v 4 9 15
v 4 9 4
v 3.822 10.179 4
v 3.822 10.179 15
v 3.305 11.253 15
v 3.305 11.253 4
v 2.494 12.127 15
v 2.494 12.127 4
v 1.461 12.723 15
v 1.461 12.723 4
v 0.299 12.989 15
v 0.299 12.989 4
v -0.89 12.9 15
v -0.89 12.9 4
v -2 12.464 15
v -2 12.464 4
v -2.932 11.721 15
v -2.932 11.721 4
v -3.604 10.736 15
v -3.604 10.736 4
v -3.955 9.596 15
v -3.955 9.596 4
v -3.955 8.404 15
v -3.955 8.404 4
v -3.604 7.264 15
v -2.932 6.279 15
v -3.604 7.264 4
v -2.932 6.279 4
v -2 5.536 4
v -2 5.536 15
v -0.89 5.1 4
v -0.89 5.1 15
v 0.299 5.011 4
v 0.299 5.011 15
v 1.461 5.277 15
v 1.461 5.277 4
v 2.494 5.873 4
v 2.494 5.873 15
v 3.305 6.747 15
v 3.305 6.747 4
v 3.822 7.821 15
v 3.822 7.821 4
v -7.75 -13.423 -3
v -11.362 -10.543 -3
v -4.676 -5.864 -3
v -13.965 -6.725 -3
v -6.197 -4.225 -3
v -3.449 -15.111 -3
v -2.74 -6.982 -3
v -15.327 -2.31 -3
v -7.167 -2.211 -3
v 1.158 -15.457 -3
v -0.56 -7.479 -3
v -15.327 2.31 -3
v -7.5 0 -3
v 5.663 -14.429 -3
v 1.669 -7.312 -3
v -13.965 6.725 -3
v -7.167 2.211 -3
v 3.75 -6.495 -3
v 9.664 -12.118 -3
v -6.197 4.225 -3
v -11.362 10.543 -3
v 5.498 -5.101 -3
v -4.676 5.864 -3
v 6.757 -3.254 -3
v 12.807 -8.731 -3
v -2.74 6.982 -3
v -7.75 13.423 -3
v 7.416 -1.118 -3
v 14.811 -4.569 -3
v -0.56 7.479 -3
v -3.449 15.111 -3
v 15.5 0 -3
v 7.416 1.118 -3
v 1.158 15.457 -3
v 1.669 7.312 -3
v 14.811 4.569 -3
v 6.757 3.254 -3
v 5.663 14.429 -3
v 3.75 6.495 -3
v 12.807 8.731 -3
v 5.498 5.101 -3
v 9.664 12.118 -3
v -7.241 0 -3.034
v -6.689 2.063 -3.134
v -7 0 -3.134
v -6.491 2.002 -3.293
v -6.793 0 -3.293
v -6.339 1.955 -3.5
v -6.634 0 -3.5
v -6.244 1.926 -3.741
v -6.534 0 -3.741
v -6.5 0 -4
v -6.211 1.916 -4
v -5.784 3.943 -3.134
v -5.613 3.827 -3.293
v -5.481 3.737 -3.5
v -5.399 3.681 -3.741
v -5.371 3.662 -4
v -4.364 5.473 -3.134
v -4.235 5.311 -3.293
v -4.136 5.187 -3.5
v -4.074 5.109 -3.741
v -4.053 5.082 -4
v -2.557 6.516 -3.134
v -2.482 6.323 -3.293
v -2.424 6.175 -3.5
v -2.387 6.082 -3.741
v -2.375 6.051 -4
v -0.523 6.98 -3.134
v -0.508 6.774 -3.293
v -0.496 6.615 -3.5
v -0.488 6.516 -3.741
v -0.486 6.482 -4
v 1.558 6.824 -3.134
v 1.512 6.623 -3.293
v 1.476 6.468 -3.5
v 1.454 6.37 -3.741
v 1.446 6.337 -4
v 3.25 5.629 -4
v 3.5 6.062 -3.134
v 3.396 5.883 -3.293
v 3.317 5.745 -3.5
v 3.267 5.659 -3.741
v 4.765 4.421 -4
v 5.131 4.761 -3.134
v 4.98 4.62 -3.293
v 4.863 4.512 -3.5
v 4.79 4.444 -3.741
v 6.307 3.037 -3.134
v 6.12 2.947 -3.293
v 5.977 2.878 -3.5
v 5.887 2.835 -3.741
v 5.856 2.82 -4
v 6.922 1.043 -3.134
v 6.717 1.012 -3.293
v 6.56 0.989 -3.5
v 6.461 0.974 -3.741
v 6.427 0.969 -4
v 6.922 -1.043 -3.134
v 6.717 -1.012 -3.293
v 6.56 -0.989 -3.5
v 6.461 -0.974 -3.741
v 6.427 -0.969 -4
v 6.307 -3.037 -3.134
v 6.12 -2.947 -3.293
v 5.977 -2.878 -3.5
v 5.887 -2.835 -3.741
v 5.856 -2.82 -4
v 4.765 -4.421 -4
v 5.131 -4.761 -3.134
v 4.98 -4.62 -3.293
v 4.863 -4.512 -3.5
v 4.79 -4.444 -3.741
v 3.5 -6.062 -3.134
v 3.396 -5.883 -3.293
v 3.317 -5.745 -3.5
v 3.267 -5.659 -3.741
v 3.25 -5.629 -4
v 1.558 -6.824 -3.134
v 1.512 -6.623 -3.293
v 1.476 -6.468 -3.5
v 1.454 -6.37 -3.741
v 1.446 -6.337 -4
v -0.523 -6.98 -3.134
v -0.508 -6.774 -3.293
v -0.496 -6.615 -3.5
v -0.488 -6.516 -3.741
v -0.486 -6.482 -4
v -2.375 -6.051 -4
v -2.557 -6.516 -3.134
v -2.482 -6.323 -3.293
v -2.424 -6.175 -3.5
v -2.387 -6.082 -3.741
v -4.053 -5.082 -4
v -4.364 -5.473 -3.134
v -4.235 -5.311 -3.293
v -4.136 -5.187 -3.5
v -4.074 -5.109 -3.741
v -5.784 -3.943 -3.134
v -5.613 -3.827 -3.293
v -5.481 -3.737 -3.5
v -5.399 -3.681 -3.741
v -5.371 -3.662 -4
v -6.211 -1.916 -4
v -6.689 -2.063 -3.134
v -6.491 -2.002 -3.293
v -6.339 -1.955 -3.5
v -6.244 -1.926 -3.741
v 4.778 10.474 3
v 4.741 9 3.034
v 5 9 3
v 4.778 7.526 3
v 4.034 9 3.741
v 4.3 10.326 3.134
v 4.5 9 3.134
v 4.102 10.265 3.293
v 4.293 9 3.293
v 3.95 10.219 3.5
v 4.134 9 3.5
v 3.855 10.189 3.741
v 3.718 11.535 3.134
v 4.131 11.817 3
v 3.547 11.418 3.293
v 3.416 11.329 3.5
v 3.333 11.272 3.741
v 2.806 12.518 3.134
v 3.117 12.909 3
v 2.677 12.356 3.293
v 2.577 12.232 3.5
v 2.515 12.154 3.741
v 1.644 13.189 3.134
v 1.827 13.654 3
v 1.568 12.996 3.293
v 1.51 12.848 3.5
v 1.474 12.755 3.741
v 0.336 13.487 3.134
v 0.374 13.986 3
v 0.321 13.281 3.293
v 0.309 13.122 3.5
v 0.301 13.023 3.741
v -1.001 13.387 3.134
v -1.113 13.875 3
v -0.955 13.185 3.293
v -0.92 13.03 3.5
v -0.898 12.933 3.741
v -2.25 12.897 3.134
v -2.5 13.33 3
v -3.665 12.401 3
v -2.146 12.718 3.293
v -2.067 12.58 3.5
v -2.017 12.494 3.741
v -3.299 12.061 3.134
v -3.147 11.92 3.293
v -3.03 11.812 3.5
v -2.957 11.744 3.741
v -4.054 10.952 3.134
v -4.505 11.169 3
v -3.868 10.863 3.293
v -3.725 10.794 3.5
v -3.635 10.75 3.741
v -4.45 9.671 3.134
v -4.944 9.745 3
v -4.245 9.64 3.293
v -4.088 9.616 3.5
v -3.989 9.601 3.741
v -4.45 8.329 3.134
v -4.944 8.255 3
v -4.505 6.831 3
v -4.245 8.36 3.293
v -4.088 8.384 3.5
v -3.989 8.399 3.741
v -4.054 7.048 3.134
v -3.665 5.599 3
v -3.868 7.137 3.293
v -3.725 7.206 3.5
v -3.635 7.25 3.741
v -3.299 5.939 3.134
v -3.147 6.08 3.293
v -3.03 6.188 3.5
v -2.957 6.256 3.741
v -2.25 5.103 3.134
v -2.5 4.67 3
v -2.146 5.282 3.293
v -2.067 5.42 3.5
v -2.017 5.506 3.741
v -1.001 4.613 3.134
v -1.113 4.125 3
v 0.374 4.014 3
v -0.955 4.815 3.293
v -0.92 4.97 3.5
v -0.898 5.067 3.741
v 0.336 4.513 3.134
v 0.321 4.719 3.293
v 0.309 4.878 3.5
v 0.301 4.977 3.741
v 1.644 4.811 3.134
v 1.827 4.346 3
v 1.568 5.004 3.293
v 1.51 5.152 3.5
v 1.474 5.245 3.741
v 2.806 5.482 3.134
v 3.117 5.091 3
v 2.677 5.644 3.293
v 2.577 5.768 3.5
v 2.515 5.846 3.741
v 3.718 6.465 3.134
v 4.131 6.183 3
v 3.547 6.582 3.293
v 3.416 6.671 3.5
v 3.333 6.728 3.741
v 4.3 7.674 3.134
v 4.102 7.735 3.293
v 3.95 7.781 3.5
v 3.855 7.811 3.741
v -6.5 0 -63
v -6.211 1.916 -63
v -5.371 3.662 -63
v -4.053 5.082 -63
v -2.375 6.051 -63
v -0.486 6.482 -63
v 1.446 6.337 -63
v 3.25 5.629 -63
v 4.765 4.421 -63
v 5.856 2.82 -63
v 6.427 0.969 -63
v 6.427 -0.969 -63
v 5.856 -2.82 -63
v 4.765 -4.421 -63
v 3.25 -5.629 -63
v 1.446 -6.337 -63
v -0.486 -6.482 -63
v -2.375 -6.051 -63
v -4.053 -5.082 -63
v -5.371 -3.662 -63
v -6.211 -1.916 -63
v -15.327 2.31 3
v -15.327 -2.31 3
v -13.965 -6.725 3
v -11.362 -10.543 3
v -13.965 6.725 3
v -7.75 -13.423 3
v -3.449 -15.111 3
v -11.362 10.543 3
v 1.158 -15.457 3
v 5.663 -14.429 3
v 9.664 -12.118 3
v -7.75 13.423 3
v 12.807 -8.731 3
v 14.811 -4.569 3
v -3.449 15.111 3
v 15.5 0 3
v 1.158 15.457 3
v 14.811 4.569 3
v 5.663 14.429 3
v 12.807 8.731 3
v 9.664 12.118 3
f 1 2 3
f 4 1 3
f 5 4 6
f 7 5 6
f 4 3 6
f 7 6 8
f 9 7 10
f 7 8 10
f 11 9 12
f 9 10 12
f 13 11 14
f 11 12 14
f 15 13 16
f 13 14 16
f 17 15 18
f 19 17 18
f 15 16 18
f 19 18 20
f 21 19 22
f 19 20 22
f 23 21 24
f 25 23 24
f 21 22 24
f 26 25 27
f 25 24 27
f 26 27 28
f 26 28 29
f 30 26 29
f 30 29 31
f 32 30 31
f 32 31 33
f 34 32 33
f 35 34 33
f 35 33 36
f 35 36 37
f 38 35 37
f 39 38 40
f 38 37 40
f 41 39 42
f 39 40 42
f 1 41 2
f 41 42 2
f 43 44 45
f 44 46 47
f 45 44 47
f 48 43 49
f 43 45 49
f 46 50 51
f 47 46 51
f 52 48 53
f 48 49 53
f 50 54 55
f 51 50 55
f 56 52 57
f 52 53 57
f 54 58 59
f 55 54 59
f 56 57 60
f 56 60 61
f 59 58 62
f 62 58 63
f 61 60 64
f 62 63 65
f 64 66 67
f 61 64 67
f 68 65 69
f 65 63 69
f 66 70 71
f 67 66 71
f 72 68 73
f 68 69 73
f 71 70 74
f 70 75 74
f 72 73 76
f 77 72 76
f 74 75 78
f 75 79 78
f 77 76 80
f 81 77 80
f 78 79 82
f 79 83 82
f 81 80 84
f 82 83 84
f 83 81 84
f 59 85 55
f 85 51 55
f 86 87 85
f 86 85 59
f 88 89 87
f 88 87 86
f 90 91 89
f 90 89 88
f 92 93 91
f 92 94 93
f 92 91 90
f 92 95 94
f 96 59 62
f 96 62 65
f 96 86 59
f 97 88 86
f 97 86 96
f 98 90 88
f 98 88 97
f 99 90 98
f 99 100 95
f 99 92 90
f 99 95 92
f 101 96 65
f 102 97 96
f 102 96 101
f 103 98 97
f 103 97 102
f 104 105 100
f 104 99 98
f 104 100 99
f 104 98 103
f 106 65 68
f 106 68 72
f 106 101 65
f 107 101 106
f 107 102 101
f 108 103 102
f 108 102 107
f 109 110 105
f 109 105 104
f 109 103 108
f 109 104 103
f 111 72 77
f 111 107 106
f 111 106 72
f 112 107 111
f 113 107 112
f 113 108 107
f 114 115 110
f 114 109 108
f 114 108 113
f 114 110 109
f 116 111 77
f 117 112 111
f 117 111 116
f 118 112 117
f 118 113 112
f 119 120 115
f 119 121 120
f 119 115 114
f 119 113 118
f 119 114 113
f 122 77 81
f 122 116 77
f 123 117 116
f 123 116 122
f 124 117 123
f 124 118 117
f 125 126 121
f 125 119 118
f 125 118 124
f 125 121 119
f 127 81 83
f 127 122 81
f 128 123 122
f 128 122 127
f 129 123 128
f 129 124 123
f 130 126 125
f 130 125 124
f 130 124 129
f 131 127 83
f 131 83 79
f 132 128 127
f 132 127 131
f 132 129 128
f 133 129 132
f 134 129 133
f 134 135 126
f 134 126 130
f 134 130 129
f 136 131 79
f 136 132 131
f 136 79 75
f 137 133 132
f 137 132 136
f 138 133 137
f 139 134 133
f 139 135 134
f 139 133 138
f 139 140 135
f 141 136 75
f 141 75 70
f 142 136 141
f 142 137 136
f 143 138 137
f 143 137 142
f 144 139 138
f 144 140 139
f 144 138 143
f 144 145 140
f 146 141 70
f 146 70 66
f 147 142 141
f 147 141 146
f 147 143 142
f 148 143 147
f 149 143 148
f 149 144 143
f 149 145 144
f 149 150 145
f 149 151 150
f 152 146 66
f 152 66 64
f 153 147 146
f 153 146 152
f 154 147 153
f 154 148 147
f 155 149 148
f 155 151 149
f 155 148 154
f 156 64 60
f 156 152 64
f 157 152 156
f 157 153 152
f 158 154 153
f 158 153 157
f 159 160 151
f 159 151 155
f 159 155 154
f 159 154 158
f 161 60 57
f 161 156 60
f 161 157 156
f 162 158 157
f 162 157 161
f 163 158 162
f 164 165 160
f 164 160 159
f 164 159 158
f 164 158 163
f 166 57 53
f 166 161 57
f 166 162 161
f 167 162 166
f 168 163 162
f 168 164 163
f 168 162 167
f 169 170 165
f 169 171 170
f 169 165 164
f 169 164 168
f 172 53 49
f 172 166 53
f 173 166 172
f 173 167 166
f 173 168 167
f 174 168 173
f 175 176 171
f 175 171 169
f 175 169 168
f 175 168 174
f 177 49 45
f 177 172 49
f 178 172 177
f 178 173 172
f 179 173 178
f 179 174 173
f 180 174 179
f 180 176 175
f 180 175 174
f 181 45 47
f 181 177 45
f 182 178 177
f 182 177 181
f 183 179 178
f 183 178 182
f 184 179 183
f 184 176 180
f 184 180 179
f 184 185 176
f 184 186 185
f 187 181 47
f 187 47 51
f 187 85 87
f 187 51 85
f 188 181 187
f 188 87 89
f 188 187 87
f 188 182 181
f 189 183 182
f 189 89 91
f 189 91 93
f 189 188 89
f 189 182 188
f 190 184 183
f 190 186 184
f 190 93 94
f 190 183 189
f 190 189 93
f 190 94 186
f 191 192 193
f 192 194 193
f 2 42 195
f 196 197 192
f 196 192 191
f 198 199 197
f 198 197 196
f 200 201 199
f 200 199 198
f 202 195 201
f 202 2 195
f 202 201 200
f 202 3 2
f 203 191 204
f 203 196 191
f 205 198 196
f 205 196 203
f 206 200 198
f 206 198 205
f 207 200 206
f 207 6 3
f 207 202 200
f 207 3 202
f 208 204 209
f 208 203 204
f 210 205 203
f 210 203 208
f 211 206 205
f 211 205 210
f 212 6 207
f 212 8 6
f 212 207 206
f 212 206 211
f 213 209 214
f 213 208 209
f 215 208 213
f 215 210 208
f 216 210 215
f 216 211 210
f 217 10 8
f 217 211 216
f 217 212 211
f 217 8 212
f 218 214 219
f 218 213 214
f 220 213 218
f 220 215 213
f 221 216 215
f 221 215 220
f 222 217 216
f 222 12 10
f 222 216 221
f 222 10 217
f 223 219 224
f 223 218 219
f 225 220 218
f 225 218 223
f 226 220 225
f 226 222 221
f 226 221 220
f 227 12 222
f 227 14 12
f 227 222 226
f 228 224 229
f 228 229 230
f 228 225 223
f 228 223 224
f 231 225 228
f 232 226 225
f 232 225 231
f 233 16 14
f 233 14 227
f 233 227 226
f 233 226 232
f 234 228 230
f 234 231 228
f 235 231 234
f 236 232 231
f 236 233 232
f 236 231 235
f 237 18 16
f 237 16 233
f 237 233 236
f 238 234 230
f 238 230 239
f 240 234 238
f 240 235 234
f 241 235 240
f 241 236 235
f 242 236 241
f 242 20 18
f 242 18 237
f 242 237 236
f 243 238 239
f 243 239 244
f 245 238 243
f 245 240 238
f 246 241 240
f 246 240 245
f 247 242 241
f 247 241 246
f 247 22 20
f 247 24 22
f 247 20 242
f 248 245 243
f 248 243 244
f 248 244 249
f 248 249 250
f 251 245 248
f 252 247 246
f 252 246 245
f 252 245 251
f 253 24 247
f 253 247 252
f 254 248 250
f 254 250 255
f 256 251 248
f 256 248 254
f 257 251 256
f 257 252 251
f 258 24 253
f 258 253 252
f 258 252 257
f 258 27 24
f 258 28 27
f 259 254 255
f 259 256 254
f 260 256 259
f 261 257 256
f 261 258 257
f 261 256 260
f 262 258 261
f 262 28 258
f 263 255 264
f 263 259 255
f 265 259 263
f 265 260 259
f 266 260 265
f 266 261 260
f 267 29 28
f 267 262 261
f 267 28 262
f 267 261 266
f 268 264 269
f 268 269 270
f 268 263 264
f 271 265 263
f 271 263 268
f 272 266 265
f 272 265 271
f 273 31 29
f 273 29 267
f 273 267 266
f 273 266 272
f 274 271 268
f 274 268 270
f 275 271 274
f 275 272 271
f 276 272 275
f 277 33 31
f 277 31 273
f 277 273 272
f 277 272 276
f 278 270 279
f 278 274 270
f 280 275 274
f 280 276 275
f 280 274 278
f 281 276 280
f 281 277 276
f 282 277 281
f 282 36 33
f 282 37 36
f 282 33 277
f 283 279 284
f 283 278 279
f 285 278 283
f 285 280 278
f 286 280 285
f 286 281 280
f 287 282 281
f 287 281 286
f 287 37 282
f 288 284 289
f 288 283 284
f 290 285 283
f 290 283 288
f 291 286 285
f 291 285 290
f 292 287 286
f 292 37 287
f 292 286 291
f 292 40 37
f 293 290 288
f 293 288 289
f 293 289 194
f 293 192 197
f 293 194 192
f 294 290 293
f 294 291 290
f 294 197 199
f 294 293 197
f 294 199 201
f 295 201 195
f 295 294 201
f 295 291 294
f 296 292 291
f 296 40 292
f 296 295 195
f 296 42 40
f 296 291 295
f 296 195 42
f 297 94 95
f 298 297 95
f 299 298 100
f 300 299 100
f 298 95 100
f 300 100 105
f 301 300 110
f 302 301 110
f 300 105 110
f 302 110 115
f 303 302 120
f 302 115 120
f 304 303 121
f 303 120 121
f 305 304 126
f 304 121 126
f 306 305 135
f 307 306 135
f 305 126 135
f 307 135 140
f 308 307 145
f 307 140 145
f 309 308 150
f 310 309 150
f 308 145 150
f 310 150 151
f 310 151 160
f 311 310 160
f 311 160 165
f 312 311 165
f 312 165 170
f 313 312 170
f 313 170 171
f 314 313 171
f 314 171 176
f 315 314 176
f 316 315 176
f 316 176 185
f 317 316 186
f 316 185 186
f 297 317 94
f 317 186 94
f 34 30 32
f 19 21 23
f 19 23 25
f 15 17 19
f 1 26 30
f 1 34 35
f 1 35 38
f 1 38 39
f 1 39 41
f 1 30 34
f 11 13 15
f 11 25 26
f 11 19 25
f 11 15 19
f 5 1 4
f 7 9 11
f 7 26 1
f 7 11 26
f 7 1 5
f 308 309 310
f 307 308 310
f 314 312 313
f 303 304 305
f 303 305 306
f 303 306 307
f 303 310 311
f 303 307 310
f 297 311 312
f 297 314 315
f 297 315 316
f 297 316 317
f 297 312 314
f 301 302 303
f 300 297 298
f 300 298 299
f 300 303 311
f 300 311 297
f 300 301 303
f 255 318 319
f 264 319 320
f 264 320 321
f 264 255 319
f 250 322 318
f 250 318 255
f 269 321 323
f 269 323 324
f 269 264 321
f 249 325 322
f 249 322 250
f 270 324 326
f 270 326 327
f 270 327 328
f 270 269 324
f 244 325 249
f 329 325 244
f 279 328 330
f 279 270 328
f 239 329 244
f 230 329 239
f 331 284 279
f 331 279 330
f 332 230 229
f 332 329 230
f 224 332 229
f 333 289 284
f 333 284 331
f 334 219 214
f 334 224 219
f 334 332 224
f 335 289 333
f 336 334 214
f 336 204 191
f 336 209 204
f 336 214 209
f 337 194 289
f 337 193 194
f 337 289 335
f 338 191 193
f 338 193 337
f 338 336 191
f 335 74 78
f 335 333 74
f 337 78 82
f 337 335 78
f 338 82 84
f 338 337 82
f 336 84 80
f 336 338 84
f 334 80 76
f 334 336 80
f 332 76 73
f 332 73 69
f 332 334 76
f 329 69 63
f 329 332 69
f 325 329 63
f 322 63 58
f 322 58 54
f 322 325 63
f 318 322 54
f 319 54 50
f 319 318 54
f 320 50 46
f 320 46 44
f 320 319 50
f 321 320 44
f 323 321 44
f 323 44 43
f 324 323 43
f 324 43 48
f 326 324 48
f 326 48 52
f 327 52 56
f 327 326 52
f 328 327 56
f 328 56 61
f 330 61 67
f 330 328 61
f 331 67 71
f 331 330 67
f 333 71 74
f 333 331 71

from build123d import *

# Parameters (mm, degrees)
SKETCH1_R           = 15.5
BOSS_EXTRUDE2_DEPTH = 3
BOSS_EXTRUDE3_START = 3
SKETCH1_6_R         = 4
BOSS_EXTRUDE3_DEPTH = 12
SKETCH2_R           = 6.5
BOSS_EXTRUDE4_DEPTH = 60
FILLET1_R           = 1


with BuildPart() as part:
    # Sketch1 → Boss-Extrude2 (new, symmetric)
    with BuildSketch(Plane.XY):
        Circle(SKETCH1_R)
    extrude(amount=BOSS_EXTRUDE2_DEPTH, both=True)

    # Sketch1<6> → Boss-Extrude3 (add)
    with BuildSketch(Plane.XY.offset(BOSS_EXTRUDE3_START)):
        with Locations((0, 9)):
            Circle(SKETCH1_6_R)
    extrude(amount=BOSS_EXTRUDE3_DEPTH)

    # Sketch2 → Boss-Extrude4 (add)
    with BuildSketch(Plane(origin=(0, 0, -3), x_dir=(-1, 0, 0), z_dir=(0, 0, -1))):
        Circle(SKETCH2_R)
    extrude(amount=BOSS_EXTRUDE4_DEPTH)

    # Fillet1
    fillet1_edges = [part.edges().sort_by_distance(p)[0] for p in [
        (-4, 9, 3),
        (6.5, 0, -3),
    ]]
    fillet(fillet1_edges, radius=FILLET1_R)


solid = part.part
